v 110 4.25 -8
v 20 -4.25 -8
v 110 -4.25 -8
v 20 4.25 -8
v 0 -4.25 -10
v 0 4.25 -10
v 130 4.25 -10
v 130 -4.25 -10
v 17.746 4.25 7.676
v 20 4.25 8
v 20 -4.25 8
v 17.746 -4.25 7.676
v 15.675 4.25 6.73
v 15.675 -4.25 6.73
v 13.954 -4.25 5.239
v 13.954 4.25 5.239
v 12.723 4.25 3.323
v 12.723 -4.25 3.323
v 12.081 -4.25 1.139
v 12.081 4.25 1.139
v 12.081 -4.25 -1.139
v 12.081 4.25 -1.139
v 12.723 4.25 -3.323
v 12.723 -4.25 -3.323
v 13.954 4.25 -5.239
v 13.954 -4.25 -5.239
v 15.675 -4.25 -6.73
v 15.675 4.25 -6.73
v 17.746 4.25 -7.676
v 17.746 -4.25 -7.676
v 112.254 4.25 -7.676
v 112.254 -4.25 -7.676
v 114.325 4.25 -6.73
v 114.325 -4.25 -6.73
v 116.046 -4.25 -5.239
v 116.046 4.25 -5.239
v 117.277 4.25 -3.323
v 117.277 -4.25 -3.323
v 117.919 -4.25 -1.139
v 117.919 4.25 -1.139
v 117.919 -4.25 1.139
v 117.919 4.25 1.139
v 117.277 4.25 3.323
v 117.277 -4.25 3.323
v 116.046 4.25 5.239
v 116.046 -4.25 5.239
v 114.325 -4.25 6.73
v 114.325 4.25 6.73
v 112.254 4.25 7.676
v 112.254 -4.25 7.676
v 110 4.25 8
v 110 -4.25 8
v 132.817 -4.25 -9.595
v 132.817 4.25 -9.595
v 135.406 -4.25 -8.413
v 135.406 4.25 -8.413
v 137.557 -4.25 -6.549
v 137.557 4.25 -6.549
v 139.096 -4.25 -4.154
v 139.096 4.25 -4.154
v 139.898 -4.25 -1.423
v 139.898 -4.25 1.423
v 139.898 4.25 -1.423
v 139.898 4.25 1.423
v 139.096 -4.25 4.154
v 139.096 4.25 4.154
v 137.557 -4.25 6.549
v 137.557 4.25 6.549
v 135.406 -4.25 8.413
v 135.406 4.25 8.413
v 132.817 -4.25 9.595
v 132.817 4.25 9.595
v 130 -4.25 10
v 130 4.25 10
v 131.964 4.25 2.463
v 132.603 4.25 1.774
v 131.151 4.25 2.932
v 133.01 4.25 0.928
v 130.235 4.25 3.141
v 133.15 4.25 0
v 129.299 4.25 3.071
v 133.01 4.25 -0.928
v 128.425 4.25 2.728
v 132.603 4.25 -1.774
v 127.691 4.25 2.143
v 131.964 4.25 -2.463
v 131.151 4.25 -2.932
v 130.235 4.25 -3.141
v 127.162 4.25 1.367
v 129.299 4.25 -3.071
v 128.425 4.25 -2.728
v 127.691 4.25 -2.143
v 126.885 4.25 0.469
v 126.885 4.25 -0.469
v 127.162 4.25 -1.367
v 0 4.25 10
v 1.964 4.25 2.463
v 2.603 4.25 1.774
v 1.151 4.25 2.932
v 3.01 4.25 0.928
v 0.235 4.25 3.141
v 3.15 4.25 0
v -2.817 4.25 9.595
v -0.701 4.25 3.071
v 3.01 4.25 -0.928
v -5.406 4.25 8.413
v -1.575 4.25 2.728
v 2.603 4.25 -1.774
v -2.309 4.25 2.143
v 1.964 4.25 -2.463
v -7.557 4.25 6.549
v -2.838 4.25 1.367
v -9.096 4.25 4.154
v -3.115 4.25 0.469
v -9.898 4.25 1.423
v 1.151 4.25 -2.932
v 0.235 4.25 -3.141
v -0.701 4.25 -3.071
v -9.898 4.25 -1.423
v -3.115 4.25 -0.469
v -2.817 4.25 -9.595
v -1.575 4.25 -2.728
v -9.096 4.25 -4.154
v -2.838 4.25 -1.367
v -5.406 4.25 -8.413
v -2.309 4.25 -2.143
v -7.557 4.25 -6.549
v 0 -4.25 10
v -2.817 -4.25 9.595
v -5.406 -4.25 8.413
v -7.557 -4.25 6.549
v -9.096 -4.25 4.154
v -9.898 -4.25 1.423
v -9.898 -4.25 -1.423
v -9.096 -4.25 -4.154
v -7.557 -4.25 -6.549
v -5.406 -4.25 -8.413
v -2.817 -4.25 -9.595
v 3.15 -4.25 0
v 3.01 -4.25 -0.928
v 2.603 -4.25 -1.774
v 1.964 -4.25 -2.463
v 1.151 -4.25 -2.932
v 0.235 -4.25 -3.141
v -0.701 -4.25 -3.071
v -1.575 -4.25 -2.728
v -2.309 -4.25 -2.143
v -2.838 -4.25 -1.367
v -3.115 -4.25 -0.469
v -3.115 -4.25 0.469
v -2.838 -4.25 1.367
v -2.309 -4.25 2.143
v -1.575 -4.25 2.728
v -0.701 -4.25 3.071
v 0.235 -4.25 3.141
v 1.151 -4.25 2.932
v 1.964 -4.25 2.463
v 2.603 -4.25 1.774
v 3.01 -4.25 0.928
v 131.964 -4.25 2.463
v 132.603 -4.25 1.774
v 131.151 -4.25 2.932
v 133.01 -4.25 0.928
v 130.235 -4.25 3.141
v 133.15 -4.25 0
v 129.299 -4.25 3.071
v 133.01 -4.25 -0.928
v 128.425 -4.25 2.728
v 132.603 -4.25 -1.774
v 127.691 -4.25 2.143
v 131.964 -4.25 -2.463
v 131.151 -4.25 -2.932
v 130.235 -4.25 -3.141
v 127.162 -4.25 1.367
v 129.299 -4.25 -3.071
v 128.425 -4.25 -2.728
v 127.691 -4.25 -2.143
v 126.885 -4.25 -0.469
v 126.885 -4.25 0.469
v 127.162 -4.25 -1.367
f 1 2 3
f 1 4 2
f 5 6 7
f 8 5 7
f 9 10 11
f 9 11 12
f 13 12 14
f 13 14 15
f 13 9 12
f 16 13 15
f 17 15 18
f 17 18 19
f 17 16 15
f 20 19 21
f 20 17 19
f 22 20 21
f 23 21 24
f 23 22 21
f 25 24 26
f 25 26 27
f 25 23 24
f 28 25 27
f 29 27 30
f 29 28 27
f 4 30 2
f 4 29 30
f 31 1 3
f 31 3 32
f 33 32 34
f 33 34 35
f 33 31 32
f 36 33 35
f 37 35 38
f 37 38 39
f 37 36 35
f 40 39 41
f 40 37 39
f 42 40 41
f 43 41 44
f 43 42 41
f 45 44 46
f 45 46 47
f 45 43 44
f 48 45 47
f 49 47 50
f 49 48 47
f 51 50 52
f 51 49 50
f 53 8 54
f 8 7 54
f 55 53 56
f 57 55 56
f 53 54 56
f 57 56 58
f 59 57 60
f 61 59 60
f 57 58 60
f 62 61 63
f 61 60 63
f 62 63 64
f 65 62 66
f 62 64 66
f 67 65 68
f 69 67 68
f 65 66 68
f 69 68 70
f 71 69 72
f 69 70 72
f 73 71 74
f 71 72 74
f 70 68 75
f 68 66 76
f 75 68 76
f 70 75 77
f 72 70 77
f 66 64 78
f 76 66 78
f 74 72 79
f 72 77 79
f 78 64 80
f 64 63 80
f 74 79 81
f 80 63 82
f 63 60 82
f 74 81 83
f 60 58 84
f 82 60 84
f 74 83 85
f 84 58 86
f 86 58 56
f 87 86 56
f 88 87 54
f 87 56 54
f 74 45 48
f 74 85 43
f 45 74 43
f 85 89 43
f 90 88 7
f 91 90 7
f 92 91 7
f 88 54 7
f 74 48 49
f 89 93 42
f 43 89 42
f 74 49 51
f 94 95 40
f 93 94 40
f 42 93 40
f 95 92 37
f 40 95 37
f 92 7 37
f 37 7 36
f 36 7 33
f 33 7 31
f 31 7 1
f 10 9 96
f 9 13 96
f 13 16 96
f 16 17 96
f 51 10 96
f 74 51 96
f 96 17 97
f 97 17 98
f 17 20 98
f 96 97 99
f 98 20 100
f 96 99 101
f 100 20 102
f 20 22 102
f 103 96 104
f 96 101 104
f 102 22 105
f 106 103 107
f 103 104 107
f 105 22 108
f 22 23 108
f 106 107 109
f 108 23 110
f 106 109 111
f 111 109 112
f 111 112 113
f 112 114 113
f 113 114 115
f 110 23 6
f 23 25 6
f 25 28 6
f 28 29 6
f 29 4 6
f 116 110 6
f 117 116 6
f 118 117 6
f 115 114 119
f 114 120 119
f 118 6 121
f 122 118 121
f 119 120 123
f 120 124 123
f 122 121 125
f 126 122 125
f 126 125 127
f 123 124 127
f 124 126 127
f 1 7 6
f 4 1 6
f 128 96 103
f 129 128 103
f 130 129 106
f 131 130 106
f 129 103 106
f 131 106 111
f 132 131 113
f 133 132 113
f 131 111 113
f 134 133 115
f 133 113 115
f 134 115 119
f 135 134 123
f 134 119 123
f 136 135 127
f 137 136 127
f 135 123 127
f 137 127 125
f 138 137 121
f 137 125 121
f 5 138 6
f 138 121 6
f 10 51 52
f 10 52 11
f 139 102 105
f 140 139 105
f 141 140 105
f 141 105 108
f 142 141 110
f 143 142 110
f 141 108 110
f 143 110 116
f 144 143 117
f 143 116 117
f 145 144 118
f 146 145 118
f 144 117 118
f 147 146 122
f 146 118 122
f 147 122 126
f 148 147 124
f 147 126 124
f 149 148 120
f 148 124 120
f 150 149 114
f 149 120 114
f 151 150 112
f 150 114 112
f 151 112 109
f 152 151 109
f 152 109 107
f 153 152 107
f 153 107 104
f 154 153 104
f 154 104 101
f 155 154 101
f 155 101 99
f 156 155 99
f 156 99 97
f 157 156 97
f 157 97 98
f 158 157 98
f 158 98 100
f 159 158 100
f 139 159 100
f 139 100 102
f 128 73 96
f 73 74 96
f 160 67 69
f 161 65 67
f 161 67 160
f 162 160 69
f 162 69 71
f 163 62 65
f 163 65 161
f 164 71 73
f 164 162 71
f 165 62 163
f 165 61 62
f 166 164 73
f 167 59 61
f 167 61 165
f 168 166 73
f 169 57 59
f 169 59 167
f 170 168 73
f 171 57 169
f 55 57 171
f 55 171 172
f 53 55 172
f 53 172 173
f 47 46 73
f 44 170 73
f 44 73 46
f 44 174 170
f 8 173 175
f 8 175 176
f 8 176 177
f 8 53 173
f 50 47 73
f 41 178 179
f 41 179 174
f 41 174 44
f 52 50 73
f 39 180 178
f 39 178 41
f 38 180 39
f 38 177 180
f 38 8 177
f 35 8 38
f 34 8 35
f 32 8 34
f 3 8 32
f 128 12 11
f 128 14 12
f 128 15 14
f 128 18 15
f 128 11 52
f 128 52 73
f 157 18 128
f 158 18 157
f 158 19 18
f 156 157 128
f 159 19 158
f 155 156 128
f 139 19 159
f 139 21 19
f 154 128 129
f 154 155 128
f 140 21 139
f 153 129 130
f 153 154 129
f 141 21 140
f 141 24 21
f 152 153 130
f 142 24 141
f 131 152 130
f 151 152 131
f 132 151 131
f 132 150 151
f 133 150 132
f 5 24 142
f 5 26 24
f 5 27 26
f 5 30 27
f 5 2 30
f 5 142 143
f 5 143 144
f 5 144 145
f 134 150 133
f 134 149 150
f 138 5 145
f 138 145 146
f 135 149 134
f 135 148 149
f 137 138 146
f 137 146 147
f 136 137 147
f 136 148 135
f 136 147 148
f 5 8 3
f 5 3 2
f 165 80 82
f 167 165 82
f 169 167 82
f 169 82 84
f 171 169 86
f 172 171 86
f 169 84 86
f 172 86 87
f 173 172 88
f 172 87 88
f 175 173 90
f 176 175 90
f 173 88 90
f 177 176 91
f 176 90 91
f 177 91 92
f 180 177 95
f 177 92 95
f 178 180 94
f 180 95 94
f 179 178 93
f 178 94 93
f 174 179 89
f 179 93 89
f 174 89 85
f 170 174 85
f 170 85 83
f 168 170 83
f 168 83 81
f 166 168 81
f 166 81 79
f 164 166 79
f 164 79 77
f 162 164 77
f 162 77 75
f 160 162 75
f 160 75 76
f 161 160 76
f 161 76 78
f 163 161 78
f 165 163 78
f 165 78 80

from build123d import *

# Parameters (mm, degrees)
BOSS_EXTRU_1_DEPTH      = 4.25
ESQUISSE2_R             = 3.15
ENL_V_MAT_EXTRU_1_DEPTH = 9.5


with BuildPart() as part:
    # Esquisse1 → Boss.-Extru.1 (new body, symmetric)
    with BuildSketch(Plane(origin=(0, 0, 0), x_dir=(1, 0, 0), z_dir=(0, 1, 0))):
        with BuildLine():
            Line((0, 10), (130, 10))
            ThreePointArc((130, 10), (140, 0), (130, -10))
            Line((130, -10), (0, -10))
            ThreePointArc((0, -10), (-10, 0), (0, 10))
        make_face()
        with BuildLine():
            Line((20, 8), (110, 8))
            ThreePointArc((110, 8), (118, 0), (110, -8))
            Line((110, -8), (20, -8))
            ThreePointArc((20, -8), (12, 0), (20, 8))
        make_face(mode=Mode.SUBTRACT)
    extrude(amount=BOSS_EXTRU_1_DEPTH, both=True)

    # Esquisse2 → Enlèv. mat.-Extru.1 (cut, through all)
    with BuildSketch(Plane(origin=(0, 4.25, 0), x_dir=(1, 0, 0), z_dir=(0, 1, 0))):
        Circle(ESQUISSE2_R)
        with Locations((130, 0)):
            Circle(ESQUISSE2_R)
    extrude(amount=-ENL_V_MAT_EXTRU_1_DEPTH, mode=Mode.SUBTRACT)


solid = part.part
